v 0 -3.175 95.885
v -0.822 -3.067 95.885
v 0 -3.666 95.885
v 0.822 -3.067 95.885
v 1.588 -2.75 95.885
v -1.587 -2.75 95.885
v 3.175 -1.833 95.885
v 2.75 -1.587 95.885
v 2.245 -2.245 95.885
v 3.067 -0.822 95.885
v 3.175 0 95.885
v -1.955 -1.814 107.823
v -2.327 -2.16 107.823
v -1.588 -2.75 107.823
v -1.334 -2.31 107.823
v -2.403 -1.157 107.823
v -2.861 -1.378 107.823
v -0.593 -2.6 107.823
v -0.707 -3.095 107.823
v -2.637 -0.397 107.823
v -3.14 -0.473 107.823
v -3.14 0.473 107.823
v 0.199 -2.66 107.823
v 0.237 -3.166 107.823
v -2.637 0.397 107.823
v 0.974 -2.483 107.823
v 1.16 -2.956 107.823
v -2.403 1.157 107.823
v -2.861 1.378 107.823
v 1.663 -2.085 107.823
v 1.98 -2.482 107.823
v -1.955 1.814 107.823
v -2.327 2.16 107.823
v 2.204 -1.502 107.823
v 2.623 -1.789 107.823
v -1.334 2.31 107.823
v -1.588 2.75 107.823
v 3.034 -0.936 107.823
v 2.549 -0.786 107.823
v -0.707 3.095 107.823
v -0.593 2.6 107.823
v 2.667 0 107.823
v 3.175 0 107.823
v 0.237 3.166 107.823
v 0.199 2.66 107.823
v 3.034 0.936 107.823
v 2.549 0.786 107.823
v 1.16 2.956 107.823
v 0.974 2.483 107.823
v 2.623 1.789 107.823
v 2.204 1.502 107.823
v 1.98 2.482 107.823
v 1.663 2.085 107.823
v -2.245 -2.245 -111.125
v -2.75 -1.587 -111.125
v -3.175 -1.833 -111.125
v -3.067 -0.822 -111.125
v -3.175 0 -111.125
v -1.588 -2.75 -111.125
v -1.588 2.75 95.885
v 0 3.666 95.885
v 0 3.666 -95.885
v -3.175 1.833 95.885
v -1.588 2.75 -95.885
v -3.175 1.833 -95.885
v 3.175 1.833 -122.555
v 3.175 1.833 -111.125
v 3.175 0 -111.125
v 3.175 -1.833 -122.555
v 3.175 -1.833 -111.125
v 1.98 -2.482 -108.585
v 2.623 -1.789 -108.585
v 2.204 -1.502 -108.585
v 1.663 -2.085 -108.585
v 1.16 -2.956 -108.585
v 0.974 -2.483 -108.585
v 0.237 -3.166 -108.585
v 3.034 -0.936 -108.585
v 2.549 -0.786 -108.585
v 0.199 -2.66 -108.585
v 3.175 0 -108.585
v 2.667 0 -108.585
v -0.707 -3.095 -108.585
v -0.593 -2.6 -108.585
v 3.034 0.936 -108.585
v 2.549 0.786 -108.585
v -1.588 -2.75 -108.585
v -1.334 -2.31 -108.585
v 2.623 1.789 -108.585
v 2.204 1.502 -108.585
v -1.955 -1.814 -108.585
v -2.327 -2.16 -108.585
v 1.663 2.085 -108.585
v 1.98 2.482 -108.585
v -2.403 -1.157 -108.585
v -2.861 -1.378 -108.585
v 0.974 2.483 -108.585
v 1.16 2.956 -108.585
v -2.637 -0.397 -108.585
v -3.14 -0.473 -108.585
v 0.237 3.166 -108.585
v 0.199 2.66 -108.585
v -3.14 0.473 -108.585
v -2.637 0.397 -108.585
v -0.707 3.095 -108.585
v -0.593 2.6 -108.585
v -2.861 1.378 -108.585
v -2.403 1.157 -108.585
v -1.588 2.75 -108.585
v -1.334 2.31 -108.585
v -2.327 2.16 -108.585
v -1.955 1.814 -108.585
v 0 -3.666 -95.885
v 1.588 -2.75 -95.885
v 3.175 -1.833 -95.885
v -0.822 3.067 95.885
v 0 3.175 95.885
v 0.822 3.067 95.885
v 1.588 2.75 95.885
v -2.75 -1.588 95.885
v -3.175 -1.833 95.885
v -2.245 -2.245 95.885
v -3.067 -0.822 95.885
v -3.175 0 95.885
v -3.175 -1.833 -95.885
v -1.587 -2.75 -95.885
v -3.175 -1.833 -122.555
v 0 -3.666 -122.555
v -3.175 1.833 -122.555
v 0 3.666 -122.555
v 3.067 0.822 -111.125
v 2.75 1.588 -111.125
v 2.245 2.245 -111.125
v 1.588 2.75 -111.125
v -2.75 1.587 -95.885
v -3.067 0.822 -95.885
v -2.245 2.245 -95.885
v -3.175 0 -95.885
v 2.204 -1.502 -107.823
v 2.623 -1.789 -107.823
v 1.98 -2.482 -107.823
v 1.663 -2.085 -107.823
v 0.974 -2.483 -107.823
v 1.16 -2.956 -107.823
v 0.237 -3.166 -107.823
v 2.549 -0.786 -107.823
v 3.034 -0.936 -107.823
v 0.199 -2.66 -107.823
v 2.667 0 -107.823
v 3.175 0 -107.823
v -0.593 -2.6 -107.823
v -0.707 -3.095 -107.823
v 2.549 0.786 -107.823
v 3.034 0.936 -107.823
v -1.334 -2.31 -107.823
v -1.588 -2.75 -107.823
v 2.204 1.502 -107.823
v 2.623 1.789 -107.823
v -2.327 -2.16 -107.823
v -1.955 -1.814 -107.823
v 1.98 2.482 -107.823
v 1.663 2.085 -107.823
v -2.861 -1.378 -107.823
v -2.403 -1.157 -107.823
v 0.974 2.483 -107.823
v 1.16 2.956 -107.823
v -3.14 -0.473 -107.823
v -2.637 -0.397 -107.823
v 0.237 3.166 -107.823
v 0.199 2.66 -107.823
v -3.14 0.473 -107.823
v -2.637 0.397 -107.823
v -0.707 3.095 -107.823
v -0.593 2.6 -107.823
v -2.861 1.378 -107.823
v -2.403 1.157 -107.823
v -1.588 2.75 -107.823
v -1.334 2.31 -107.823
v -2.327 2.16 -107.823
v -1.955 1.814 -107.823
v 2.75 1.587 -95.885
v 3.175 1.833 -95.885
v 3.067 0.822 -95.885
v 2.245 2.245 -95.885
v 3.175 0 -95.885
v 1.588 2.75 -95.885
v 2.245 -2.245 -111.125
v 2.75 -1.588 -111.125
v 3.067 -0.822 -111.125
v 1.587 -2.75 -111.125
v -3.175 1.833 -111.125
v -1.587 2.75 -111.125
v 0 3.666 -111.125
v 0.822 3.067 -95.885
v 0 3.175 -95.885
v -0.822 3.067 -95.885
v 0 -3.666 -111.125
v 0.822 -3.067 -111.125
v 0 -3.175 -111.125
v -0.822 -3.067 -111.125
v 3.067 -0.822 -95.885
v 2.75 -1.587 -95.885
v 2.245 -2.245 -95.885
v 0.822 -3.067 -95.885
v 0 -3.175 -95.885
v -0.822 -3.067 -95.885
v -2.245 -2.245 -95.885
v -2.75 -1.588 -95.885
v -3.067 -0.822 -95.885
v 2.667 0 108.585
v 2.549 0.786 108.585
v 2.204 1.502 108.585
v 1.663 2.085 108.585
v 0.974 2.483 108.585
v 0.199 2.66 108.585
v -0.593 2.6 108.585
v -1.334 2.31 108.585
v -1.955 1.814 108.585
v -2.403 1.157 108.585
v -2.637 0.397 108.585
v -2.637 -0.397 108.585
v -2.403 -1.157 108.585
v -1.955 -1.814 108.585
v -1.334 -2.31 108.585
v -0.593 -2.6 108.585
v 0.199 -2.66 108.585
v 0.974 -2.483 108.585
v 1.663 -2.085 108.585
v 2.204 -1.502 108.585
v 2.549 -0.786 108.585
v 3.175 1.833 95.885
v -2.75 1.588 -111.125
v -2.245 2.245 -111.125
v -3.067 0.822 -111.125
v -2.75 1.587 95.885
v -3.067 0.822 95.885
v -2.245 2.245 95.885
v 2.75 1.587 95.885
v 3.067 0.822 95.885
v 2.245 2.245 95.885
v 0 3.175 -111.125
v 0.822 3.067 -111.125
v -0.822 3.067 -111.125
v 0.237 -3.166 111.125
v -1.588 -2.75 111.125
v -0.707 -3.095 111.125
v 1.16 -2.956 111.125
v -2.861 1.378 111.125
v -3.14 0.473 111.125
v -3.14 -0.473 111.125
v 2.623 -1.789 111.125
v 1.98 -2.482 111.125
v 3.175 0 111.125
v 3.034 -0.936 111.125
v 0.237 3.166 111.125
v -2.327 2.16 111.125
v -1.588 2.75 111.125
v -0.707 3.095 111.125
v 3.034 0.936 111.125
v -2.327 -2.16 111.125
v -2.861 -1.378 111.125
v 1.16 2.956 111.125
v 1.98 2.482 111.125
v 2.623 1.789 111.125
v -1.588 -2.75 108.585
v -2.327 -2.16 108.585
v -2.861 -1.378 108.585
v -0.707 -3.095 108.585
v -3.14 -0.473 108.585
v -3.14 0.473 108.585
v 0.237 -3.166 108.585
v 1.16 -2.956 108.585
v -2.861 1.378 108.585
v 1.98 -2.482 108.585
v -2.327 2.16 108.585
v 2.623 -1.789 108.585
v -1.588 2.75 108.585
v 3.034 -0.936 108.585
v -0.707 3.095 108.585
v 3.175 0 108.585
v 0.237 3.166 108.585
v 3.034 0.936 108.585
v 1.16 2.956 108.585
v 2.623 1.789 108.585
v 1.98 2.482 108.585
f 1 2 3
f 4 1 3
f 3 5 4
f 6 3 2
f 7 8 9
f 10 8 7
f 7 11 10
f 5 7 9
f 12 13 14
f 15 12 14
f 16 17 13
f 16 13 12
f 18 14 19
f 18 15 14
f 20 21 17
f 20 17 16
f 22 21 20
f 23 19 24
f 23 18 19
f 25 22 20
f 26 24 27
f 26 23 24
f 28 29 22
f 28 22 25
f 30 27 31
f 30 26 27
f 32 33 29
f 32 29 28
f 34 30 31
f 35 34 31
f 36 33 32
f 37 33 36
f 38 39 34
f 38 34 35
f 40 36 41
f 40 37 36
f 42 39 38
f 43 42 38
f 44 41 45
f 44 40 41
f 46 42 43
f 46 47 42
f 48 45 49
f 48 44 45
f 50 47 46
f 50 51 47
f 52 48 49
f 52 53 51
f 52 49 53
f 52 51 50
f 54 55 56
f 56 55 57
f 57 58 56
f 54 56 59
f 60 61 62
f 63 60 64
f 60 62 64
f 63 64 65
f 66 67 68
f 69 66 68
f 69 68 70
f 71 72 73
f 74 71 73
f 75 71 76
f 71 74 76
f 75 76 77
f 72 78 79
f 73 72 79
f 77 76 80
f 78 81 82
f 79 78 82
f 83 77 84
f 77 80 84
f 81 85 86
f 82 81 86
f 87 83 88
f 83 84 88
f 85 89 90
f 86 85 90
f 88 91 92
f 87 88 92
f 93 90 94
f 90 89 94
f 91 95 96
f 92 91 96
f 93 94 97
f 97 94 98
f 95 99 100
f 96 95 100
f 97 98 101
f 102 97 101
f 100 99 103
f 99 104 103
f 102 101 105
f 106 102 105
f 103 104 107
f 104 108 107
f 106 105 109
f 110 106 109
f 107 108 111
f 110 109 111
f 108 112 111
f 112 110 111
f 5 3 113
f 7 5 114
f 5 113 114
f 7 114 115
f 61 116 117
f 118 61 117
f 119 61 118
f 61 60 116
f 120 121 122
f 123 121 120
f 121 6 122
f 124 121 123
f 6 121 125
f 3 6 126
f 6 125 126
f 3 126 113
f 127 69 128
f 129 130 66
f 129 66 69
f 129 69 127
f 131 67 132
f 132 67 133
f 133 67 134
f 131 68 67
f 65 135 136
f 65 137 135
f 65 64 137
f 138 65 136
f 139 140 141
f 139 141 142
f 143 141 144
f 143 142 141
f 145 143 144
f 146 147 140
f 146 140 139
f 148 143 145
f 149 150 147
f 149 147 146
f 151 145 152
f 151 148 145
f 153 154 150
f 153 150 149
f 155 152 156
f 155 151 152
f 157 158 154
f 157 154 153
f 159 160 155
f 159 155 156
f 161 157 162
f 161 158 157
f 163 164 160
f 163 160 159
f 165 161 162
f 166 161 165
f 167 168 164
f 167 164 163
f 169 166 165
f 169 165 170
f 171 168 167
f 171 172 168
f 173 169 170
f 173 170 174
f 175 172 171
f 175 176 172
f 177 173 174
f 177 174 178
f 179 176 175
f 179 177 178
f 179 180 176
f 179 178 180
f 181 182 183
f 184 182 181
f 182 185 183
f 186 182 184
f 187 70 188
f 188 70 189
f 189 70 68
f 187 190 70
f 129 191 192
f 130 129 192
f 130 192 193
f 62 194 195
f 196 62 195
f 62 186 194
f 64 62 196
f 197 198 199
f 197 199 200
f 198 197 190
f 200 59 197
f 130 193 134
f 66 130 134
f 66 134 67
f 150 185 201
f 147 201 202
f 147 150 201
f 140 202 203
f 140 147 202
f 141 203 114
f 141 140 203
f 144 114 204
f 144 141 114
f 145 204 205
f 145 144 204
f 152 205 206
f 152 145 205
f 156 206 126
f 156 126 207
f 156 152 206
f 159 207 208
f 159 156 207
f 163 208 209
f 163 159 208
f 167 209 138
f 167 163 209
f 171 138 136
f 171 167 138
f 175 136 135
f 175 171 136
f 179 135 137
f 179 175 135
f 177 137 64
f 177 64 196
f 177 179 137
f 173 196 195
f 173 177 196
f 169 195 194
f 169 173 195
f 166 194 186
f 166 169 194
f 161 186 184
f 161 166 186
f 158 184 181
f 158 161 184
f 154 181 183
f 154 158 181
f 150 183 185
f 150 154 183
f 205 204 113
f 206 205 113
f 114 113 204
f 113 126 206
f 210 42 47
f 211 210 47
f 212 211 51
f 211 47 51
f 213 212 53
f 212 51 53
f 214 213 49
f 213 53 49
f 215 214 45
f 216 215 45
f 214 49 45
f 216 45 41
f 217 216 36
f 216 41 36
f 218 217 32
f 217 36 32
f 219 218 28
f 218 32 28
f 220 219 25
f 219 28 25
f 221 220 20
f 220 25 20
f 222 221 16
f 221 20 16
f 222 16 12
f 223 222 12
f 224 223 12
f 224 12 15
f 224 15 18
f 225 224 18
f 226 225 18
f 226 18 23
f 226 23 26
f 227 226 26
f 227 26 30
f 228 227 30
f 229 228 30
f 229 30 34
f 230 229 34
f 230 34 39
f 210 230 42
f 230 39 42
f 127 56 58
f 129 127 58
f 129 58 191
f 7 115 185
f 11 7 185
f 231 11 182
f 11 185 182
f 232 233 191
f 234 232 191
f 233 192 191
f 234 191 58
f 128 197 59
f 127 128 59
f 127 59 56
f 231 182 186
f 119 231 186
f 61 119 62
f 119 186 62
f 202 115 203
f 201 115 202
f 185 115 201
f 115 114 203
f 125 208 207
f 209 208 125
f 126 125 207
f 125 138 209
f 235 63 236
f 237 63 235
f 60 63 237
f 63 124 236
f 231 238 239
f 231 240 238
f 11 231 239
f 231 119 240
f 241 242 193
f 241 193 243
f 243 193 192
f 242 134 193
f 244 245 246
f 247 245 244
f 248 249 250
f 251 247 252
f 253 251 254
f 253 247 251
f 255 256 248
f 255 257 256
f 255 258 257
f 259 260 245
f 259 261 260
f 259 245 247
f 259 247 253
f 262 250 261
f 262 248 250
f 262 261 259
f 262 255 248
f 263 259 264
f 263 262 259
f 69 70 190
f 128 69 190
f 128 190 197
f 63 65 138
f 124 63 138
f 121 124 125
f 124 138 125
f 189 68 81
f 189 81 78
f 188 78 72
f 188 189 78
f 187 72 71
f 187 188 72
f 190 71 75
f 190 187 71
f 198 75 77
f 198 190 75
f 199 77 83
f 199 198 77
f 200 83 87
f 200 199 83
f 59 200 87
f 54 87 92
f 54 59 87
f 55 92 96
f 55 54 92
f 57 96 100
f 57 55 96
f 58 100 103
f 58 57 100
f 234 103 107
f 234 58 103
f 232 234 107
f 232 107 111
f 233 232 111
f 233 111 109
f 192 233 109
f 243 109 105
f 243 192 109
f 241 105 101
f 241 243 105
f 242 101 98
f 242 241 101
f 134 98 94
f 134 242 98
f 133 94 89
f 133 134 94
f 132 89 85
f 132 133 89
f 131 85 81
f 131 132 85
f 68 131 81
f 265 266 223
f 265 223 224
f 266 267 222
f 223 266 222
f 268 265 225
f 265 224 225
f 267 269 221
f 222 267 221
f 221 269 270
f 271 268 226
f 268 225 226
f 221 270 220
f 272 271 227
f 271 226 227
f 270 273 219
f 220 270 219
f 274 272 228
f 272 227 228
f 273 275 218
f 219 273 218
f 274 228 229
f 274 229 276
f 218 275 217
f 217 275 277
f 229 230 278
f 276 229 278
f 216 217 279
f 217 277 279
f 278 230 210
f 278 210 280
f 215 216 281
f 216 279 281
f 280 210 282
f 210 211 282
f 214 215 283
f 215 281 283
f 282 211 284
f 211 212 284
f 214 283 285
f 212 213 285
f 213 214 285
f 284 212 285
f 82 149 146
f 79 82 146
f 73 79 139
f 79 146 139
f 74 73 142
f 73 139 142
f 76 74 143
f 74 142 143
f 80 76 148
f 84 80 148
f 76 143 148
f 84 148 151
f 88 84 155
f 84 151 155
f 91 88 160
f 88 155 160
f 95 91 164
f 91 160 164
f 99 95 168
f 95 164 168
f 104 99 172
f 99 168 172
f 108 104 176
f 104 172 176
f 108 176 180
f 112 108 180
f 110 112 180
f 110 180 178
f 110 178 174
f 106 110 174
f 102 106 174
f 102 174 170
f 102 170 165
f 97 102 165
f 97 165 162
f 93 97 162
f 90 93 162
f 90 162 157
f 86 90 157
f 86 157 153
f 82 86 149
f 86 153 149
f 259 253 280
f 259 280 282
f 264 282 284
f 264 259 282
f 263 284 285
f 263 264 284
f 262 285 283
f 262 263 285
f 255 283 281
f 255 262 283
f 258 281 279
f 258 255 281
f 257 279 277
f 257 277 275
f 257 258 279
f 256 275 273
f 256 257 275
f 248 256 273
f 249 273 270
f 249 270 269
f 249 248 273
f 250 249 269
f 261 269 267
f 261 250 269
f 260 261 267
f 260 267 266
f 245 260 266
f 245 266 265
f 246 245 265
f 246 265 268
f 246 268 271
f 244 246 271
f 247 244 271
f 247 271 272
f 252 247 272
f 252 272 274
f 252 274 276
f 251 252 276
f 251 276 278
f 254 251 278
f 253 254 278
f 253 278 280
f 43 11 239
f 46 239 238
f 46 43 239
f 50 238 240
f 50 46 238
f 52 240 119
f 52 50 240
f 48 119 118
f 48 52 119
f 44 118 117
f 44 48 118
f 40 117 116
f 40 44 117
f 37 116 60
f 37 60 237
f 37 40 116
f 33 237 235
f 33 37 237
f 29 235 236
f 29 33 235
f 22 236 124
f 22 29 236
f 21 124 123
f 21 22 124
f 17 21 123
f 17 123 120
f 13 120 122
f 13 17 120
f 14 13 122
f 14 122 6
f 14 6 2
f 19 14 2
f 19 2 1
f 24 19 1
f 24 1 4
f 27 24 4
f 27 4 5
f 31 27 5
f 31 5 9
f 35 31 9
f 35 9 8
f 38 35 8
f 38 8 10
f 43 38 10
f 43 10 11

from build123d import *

# Parameters (mm, degrees)
BOSS_EXTRUDE2_DEPTH      = 111.125
BOSS_EXTRUDE2_DEPTH_BACK = 111.125
SKETCH4_OUTSIDE_W        = 52.842
SKETCH4_OUTSIDE_H        = 53.824
SKETCH4_OUTSIDE_R        = 3.175
CUT_EXTRUDE1_DEPTH       = 15.24
SKETCH5_OUTSIDE_W        = 52.842
SKETCH5_OUTSIDE_H        = 53.824
SKETCH5_OUTSIDE_R        = 3.175
CUT_EXTRUDE4_DEPTH       = 15.24
SKETCH7_OUTSIDE_W        = 52.842
SKETCH7_OUTSIDE_H        = 53.824
SKETCH7_OUTSIDE_R        = 2.667
CUT_EXTRUDE8_DEPTH       = 0.762
SKETCH8_OUTSIDE_W        = 52.842
SKETCH8_OUTSIDE_H        = 53.824
SKETCH8_OUTSIDE_R        = 2.667
CUT_EXTRUDE9_DEPTH       = 0.762
BOSS_EXTRUDE4_DEPTH      = 11.43


with BuildPart() as part:
    # Sketch3 → Boss-Extrude2 (new, two sides: drawn at the far end of the back side and taken through both)
    with BuildSketch(Plane.XY.offset(-BOSS_EXTRUDE2_DEPTH_BACK)):
        Polygon((0, 3.666174209), (-3.175, 1.833087105), (-3.175, -1.833087105), (0, -3.666174209), (3.175, -1.833087105), (3.175, 1.833087105), align=None)
    extrude(amount=BOSS_EXTRUDE2_DEPTH + BOSS_EXTRUDE2_DEPTH_BACK)

    # Sketch4 outside → Cut-Extrude1 (cut)
    with BuildSketch(Plane.XY.offset(111.125)):
        Rectangle(SKETCH4_OUTSIDE_W, SKETCH4_OUTSIDE_H)
        Circle(SKETCH4_OUTSIDE_R, mode=Mode.SUBTRACT)
    extrude(amount=-CUT_EXTRUDE1_DEPTH, mode=Mode.SUBTRACT)

    # Sketch5 outside → Cut-Extrude4 (cut)
    with BuildSketch(Plane(origin=(0, 0, -111.125), x_dir=(-1, 0, 0), z_dir=(0, 0, -1))):
        Rectangle(SKETCH5_OUTSIDE_W, SKETCH5_OUTSIDE_H)
        with Locations(Location((0, 0, 0), (0, 0, 180))):
            Circle(SKETCH5_OUTSIDE_R, mode=Mode.SUBTRACT)
    extrude(amount=-CUT_EXTRUDE4_DEPTH, mode=Mode.SUBTRACT)

    # Sketch7 outside → Cut-Extrude8 (cut)
    with BuildSketch(Plane(origin=(0, 0, -107.823), x_dir=(-1, 0, 0), z_dir=(0, 0, -1))):
        Rectangle(SKETCH7_OUTSIDE_W, SKETCH7_OUTSIDE_H)
        with Locations(Location((0, 0, 0), (0, 0, 180))):
            Circle(SKETCH7_OUTSIDE_R, mode=Mode.SUBTRACT)
    extrude(amount=CUT_EXTRUDE8_DEPTH, mode=Mode.SUBTRACT)

    # Sketch8 outside → Cut-Extrude9 (cut)
    with BuildSketch(Plane.XY.offset(107.823)):
        Rectangle(SKETCH8_OUTSIDE_W, SKETCH8_OUTSIDE_H)
        Circle(SKETCH8_OUTSIDE_R, mode=Mode.SUBTRACT)
    extrude(amount=CUT_EXTRUDE9_DEPTH, mode=Mode.SUBTRACT)

    # Sketch13 → Boss-Extrude4 (add)
    with BuildSketch(Plane(origin=(0, 0, -111.125), x_dir=(-1, 0, 0), z_dir=(0, 0, -1))):
        Polygon((0, 3.666174278), (-3.175000059, 1.833087139), (-3.175000059, -1.833087139), (0, -3.666174278), (3.175000059, -1.833087139), (3.175000059, 1.833087139), align=None)
    extrude(amount=BOSS_EXTRUDE4_DEPTH)


solid = part.part
